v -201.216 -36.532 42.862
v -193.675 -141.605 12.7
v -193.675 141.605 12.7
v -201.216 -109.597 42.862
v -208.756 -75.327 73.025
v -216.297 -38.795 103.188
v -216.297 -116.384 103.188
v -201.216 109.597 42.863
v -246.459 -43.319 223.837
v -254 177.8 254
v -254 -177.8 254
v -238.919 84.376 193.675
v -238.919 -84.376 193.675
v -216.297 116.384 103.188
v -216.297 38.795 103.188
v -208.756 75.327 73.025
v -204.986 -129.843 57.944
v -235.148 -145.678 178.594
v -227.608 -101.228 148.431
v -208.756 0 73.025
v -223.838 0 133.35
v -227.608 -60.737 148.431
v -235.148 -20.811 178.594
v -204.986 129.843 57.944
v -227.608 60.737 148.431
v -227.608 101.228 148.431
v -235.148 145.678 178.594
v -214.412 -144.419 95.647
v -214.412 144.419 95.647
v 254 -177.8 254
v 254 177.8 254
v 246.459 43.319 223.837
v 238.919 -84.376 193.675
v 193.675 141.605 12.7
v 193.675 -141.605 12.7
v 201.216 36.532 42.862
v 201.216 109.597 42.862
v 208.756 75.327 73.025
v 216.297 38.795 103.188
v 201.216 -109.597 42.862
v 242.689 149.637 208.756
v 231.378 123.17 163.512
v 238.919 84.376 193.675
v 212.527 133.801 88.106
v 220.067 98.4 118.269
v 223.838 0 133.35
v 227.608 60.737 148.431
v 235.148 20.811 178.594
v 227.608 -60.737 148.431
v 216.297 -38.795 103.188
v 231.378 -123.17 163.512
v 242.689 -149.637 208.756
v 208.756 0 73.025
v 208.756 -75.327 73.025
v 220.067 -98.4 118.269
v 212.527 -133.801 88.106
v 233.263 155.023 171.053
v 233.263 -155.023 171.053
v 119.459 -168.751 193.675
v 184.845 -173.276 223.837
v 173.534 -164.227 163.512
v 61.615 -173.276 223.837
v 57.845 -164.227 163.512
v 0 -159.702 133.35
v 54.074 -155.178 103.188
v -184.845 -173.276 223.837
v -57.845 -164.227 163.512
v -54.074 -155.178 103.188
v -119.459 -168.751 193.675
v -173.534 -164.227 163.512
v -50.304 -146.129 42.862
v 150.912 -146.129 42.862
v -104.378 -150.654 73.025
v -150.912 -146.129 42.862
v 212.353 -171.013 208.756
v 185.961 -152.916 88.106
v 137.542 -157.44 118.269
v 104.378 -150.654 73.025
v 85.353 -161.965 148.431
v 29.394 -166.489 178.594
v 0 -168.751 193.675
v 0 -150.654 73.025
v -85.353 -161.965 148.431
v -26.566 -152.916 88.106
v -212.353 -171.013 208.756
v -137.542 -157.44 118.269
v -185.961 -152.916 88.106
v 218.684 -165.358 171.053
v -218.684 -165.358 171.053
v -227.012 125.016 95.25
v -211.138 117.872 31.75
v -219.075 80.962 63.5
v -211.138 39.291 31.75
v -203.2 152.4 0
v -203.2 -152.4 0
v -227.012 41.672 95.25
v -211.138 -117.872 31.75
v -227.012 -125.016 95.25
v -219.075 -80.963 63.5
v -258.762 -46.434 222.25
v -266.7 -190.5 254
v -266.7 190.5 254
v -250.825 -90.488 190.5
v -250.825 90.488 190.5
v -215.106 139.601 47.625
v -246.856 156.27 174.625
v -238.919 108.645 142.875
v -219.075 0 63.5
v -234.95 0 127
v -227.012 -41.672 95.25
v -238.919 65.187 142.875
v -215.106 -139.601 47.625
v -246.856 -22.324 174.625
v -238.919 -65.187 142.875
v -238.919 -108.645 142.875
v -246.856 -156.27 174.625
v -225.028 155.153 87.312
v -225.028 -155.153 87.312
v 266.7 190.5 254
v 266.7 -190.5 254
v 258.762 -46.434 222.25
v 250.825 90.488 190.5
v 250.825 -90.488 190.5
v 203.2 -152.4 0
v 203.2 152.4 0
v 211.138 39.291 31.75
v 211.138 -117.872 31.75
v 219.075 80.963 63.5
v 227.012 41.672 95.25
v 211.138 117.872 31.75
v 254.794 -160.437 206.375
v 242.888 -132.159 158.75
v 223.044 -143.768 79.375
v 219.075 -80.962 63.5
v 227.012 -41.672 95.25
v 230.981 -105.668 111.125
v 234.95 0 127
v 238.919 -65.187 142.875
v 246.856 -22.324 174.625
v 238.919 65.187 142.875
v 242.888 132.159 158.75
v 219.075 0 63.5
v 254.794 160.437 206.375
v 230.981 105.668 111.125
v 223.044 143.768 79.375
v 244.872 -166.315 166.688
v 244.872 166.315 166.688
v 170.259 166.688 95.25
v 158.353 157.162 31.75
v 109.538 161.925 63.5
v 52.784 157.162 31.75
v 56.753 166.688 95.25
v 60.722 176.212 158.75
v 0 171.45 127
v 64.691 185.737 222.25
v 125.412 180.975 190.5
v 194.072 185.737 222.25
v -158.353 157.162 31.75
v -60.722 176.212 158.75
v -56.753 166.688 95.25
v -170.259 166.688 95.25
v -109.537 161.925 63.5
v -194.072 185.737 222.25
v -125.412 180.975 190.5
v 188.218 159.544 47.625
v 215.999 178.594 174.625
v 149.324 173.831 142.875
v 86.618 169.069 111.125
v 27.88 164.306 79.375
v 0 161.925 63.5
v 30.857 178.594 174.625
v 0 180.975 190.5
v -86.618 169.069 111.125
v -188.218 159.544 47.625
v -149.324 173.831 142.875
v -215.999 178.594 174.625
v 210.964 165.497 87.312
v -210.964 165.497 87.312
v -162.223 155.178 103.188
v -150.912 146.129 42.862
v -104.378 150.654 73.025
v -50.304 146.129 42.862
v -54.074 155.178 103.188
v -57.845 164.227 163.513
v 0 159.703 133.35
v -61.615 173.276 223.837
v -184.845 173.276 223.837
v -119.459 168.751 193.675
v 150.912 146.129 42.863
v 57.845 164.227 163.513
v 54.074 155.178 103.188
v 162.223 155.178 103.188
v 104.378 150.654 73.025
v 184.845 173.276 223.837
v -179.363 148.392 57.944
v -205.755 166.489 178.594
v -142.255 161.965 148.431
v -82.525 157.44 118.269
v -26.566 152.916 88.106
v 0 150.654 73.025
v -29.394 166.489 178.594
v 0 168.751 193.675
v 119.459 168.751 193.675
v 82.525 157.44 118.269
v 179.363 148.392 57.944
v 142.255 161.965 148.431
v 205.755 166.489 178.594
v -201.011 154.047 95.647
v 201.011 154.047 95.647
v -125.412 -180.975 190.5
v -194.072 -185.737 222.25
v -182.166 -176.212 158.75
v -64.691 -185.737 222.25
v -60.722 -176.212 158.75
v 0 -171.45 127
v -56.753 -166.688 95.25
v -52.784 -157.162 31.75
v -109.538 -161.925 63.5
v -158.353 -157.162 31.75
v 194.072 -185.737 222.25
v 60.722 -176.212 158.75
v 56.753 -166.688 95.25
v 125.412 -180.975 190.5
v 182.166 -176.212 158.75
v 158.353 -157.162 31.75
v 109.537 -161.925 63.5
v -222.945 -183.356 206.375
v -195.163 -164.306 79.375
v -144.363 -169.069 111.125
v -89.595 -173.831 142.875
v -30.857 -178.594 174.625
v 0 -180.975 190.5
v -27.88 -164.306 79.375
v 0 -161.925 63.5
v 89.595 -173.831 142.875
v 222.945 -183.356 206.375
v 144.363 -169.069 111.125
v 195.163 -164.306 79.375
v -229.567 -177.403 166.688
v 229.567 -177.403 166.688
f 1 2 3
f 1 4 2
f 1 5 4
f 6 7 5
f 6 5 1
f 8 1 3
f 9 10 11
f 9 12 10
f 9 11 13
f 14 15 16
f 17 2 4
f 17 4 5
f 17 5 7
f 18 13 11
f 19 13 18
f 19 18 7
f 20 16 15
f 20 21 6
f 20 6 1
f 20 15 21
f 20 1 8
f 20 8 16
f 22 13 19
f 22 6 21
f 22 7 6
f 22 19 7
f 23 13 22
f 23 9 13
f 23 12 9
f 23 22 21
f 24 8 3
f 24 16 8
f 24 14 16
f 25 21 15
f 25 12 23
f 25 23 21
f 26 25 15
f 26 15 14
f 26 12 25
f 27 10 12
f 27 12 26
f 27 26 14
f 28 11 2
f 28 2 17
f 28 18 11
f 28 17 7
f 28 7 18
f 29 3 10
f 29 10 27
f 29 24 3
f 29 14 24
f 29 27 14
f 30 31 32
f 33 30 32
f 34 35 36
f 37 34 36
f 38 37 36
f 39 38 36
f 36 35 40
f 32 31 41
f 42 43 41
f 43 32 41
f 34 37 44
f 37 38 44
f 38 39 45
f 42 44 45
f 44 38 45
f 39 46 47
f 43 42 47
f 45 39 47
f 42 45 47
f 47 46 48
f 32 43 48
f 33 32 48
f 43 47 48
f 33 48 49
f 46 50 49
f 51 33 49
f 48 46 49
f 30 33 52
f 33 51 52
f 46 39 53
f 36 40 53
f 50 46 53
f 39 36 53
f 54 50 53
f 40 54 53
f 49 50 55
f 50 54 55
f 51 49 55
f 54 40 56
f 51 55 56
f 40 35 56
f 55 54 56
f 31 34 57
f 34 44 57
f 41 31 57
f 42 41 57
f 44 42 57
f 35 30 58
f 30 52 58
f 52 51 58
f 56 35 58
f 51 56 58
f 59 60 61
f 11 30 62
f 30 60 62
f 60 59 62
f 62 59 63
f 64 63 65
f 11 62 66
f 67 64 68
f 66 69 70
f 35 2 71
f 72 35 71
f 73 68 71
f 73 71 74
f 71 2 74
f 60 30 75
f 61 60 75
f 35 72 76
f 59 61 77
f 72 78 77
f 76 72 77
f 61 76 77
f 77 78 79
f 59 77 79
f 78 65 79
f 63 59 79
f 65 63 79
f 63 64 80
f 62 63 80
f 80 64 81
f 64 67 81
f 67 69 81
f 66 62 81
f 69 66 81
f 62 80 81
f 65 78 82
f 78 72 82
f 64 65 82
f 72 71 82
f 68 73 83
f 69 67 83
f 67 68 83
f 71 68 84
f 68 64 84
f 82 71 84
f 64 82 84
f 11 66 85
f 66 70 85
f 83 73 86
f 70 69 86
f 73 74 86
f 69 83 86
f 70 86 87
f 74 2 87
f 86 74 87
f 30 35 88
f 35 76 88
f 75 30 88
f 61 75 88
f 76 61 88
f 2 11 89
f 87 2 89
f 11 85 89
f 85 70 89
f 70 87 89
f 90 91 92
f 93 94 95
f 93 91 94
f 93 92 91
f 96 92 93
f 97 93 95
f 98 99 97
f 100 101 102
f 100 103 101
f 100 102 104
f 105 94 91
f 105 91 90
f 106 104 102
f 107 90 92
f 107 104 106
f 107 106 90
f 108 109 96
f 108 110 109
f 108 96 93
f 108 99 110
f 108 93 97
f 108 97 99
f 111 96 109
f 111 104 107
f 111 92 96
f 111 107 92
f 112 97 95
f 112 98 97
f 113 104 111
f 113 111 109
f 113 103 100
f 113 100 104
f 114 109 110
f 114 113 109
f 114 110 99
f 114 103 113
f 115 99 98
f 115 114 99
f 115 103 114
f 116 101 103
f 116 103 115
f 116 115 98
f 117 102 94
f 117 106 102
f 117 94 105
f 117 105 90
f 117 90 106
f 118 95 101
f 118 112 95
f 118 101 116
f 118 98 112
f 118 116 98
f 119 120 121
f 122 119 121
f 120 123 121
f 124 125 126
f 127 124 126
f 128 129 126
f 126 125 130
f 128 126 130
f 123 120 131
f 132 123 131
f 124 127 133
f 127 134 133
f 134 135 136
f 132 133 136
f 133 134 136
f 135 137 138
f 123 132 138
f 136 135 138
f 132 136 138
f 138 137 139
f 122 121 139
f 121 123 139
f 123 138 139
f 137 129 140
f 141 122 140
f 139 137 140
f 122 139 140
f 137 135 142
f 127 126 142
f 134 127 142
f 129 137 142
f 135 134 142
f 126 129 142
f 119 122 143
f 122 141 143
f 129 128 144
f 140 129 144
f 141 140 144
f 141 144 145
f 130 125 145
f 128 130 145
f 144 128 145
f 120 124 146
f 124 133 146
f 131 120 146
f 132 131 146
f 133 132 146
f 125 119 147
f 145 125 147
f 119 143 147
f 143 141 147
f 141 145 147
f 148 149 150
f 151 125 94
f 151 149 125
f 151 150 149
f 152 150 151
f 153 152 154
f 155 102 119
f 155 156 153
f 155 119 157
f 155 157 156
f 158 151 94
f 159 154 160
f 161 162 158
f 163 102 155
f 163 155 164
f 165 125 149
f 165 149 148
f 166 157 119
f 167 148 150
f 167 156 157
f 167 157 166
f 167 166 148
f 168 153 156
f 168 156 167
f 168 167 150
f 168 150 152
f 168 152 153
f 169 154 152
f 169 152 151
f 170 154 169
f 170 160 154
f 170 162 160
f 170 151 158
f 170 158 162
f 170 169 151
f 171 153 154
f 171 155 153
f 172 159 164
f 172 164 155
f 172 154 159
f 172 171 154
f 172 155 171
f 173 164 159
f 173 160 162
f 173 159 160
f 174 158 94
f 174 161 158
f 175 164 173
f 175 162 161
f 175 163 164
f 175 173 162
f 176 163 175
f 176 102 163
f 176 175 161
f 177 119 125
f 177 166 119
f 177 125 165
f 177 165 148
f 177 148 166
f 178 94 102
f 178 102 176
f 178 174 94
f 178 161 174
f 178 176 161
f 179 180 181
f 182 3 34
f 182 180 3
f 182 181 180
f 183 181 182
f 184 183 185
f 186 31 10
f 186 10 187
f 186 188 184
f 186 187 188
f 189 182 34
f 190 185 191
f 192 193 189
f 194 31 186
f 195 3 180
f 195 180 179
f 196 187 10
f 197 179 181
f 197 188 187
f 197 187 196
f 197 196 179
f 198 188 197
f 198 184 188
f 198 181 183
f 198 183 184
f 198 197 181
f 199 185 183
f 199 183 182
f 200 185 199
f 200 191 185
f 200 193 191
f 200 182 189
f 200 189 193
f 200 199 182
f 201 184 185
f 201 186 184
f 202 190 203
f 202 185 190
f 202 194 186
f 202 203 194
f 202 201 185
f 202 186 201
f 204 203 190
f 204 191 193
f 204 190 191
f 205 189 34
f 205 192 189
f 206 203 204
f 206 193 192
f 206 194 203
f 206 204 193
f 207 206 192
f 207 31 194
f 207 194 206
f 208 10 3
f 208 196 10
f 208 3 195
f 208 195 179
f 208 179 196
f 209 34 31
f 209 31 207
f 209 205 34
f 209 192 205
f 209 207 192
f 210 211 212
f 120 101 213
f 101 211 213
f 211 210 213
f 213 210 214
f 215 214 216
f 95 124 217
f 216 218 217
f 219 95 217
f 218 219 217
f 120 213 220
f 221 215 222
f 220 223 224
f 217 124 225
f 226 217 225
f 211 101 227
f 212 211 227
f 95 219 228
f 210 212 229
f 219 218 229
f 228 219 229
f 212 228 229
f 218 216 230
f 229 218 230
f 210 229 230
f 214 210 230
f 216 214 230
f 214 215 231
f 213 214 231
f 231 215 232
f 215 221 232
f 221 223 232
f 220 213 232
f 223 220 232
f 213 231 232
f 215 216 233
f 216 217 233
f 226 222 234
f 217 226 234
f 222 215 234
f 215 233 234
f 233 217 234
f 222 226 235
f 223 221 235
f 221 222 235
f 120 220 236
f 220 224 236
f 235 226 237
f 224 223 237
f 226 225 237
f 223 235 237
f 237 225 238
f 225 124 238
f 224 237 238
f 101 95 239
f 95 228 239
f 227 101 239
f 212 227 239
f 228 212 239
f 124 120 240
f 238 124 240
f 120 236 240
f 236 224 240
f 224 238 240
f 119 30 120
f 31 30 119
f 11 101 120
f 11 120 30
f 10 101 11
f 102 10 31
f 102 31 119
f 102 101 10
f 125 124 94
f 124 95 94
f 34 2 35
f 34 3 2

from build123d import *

# Parameters (mm, degrees)
F0_W     = 381
F0_H     = 279.4
F7_DEPTH = 12.7


with BuildPart() as f3:
    # F0 (on Top) → F3 section 0
    with BuildSketch(Plane.XY):
        Polygon((203.2, 152.4), (-203.2, 152.4), (-190.5, 139.7), (190.5, 139.7), align=None)
    # F2 (on offset) → F3 section 1
    with BuildSketch(Plane.XY.offset(254)):
        Polygon((266.7, 190.5), (-266.7, 190.5), (-254, 177.8), (254, 177.8), align=None)
    loft()

    # F0 (on Top) → F4 section 0
    with BuildSketch(Plane.XY):
        Polygon((-190.5, 139.7), (-203.2, 152.4), (-203.2, -152.4), (-190.5, -139.7), align=None)
    # F2 (on offset) → F4 section 1
    with BuildSketch(Plane.XY.offset(254)):
        Polygon((-254, 177.8), (-266.7, 190.5), (-266.7, -190.5), (-254, -177.8), align=None)
    loft()

    # F2 (on offset) → F5 section 0
    with BuildSketch(Plane.XY.offset(254)):
        Polygon((-254, -177.8), (-266.7, -190.5), (266.7, -190.5), (254, -177.8), align=None)
    # F0 (on Top) → F5 section 1
    with BuildSketch(Plane.XY):
        Polygon((-190.5, -139.7), (-203.2, -152.4), (203.2, -152.4), (190.5, -139.7), align=None)
    loft()

    # F2 (on offset) → F6 section 0
    with BuildSketch(Plane.XY.offset(254)):
        Polygon((266.7, -190.5), (266.7, 190.5), (254, 177.8), (254, -177.8), align=None)
    # F0 (on Top) → F6 section 1
    with BuildSketch(Plane.XY):
        Polygon((203.2, -152.4), (203.2, 152.4), (190.5, 139.7), (190.5, -139.7), align=None)
    loft()

    # F0 (on Top) → F7 (join)
    with BuildSketch(Plane.XY):
        Polygon((203.2, 152.4), (-203.2, 152.4), (-190.5, 139.7), (190.5, 139.7), align=None)
        Polygon((-190.5, 139.7), (-203.2, 152.4), (-203.2, -152.4), (-190.5, -139.7), align=None)
        Polygon((-190.5, -139.7), (-203.2, -152.4), (203.2, -152.4), (190.5, -139.7), align=None)
        Polygon((203.2, -152.4), (203.2, 152.4), (190.5, 139.7), (190.5, -139.7), align=None)
        Rectangle(F0_W, F0_H)
    extrude(amount=F7_DEPTH)


solid = f3.part
